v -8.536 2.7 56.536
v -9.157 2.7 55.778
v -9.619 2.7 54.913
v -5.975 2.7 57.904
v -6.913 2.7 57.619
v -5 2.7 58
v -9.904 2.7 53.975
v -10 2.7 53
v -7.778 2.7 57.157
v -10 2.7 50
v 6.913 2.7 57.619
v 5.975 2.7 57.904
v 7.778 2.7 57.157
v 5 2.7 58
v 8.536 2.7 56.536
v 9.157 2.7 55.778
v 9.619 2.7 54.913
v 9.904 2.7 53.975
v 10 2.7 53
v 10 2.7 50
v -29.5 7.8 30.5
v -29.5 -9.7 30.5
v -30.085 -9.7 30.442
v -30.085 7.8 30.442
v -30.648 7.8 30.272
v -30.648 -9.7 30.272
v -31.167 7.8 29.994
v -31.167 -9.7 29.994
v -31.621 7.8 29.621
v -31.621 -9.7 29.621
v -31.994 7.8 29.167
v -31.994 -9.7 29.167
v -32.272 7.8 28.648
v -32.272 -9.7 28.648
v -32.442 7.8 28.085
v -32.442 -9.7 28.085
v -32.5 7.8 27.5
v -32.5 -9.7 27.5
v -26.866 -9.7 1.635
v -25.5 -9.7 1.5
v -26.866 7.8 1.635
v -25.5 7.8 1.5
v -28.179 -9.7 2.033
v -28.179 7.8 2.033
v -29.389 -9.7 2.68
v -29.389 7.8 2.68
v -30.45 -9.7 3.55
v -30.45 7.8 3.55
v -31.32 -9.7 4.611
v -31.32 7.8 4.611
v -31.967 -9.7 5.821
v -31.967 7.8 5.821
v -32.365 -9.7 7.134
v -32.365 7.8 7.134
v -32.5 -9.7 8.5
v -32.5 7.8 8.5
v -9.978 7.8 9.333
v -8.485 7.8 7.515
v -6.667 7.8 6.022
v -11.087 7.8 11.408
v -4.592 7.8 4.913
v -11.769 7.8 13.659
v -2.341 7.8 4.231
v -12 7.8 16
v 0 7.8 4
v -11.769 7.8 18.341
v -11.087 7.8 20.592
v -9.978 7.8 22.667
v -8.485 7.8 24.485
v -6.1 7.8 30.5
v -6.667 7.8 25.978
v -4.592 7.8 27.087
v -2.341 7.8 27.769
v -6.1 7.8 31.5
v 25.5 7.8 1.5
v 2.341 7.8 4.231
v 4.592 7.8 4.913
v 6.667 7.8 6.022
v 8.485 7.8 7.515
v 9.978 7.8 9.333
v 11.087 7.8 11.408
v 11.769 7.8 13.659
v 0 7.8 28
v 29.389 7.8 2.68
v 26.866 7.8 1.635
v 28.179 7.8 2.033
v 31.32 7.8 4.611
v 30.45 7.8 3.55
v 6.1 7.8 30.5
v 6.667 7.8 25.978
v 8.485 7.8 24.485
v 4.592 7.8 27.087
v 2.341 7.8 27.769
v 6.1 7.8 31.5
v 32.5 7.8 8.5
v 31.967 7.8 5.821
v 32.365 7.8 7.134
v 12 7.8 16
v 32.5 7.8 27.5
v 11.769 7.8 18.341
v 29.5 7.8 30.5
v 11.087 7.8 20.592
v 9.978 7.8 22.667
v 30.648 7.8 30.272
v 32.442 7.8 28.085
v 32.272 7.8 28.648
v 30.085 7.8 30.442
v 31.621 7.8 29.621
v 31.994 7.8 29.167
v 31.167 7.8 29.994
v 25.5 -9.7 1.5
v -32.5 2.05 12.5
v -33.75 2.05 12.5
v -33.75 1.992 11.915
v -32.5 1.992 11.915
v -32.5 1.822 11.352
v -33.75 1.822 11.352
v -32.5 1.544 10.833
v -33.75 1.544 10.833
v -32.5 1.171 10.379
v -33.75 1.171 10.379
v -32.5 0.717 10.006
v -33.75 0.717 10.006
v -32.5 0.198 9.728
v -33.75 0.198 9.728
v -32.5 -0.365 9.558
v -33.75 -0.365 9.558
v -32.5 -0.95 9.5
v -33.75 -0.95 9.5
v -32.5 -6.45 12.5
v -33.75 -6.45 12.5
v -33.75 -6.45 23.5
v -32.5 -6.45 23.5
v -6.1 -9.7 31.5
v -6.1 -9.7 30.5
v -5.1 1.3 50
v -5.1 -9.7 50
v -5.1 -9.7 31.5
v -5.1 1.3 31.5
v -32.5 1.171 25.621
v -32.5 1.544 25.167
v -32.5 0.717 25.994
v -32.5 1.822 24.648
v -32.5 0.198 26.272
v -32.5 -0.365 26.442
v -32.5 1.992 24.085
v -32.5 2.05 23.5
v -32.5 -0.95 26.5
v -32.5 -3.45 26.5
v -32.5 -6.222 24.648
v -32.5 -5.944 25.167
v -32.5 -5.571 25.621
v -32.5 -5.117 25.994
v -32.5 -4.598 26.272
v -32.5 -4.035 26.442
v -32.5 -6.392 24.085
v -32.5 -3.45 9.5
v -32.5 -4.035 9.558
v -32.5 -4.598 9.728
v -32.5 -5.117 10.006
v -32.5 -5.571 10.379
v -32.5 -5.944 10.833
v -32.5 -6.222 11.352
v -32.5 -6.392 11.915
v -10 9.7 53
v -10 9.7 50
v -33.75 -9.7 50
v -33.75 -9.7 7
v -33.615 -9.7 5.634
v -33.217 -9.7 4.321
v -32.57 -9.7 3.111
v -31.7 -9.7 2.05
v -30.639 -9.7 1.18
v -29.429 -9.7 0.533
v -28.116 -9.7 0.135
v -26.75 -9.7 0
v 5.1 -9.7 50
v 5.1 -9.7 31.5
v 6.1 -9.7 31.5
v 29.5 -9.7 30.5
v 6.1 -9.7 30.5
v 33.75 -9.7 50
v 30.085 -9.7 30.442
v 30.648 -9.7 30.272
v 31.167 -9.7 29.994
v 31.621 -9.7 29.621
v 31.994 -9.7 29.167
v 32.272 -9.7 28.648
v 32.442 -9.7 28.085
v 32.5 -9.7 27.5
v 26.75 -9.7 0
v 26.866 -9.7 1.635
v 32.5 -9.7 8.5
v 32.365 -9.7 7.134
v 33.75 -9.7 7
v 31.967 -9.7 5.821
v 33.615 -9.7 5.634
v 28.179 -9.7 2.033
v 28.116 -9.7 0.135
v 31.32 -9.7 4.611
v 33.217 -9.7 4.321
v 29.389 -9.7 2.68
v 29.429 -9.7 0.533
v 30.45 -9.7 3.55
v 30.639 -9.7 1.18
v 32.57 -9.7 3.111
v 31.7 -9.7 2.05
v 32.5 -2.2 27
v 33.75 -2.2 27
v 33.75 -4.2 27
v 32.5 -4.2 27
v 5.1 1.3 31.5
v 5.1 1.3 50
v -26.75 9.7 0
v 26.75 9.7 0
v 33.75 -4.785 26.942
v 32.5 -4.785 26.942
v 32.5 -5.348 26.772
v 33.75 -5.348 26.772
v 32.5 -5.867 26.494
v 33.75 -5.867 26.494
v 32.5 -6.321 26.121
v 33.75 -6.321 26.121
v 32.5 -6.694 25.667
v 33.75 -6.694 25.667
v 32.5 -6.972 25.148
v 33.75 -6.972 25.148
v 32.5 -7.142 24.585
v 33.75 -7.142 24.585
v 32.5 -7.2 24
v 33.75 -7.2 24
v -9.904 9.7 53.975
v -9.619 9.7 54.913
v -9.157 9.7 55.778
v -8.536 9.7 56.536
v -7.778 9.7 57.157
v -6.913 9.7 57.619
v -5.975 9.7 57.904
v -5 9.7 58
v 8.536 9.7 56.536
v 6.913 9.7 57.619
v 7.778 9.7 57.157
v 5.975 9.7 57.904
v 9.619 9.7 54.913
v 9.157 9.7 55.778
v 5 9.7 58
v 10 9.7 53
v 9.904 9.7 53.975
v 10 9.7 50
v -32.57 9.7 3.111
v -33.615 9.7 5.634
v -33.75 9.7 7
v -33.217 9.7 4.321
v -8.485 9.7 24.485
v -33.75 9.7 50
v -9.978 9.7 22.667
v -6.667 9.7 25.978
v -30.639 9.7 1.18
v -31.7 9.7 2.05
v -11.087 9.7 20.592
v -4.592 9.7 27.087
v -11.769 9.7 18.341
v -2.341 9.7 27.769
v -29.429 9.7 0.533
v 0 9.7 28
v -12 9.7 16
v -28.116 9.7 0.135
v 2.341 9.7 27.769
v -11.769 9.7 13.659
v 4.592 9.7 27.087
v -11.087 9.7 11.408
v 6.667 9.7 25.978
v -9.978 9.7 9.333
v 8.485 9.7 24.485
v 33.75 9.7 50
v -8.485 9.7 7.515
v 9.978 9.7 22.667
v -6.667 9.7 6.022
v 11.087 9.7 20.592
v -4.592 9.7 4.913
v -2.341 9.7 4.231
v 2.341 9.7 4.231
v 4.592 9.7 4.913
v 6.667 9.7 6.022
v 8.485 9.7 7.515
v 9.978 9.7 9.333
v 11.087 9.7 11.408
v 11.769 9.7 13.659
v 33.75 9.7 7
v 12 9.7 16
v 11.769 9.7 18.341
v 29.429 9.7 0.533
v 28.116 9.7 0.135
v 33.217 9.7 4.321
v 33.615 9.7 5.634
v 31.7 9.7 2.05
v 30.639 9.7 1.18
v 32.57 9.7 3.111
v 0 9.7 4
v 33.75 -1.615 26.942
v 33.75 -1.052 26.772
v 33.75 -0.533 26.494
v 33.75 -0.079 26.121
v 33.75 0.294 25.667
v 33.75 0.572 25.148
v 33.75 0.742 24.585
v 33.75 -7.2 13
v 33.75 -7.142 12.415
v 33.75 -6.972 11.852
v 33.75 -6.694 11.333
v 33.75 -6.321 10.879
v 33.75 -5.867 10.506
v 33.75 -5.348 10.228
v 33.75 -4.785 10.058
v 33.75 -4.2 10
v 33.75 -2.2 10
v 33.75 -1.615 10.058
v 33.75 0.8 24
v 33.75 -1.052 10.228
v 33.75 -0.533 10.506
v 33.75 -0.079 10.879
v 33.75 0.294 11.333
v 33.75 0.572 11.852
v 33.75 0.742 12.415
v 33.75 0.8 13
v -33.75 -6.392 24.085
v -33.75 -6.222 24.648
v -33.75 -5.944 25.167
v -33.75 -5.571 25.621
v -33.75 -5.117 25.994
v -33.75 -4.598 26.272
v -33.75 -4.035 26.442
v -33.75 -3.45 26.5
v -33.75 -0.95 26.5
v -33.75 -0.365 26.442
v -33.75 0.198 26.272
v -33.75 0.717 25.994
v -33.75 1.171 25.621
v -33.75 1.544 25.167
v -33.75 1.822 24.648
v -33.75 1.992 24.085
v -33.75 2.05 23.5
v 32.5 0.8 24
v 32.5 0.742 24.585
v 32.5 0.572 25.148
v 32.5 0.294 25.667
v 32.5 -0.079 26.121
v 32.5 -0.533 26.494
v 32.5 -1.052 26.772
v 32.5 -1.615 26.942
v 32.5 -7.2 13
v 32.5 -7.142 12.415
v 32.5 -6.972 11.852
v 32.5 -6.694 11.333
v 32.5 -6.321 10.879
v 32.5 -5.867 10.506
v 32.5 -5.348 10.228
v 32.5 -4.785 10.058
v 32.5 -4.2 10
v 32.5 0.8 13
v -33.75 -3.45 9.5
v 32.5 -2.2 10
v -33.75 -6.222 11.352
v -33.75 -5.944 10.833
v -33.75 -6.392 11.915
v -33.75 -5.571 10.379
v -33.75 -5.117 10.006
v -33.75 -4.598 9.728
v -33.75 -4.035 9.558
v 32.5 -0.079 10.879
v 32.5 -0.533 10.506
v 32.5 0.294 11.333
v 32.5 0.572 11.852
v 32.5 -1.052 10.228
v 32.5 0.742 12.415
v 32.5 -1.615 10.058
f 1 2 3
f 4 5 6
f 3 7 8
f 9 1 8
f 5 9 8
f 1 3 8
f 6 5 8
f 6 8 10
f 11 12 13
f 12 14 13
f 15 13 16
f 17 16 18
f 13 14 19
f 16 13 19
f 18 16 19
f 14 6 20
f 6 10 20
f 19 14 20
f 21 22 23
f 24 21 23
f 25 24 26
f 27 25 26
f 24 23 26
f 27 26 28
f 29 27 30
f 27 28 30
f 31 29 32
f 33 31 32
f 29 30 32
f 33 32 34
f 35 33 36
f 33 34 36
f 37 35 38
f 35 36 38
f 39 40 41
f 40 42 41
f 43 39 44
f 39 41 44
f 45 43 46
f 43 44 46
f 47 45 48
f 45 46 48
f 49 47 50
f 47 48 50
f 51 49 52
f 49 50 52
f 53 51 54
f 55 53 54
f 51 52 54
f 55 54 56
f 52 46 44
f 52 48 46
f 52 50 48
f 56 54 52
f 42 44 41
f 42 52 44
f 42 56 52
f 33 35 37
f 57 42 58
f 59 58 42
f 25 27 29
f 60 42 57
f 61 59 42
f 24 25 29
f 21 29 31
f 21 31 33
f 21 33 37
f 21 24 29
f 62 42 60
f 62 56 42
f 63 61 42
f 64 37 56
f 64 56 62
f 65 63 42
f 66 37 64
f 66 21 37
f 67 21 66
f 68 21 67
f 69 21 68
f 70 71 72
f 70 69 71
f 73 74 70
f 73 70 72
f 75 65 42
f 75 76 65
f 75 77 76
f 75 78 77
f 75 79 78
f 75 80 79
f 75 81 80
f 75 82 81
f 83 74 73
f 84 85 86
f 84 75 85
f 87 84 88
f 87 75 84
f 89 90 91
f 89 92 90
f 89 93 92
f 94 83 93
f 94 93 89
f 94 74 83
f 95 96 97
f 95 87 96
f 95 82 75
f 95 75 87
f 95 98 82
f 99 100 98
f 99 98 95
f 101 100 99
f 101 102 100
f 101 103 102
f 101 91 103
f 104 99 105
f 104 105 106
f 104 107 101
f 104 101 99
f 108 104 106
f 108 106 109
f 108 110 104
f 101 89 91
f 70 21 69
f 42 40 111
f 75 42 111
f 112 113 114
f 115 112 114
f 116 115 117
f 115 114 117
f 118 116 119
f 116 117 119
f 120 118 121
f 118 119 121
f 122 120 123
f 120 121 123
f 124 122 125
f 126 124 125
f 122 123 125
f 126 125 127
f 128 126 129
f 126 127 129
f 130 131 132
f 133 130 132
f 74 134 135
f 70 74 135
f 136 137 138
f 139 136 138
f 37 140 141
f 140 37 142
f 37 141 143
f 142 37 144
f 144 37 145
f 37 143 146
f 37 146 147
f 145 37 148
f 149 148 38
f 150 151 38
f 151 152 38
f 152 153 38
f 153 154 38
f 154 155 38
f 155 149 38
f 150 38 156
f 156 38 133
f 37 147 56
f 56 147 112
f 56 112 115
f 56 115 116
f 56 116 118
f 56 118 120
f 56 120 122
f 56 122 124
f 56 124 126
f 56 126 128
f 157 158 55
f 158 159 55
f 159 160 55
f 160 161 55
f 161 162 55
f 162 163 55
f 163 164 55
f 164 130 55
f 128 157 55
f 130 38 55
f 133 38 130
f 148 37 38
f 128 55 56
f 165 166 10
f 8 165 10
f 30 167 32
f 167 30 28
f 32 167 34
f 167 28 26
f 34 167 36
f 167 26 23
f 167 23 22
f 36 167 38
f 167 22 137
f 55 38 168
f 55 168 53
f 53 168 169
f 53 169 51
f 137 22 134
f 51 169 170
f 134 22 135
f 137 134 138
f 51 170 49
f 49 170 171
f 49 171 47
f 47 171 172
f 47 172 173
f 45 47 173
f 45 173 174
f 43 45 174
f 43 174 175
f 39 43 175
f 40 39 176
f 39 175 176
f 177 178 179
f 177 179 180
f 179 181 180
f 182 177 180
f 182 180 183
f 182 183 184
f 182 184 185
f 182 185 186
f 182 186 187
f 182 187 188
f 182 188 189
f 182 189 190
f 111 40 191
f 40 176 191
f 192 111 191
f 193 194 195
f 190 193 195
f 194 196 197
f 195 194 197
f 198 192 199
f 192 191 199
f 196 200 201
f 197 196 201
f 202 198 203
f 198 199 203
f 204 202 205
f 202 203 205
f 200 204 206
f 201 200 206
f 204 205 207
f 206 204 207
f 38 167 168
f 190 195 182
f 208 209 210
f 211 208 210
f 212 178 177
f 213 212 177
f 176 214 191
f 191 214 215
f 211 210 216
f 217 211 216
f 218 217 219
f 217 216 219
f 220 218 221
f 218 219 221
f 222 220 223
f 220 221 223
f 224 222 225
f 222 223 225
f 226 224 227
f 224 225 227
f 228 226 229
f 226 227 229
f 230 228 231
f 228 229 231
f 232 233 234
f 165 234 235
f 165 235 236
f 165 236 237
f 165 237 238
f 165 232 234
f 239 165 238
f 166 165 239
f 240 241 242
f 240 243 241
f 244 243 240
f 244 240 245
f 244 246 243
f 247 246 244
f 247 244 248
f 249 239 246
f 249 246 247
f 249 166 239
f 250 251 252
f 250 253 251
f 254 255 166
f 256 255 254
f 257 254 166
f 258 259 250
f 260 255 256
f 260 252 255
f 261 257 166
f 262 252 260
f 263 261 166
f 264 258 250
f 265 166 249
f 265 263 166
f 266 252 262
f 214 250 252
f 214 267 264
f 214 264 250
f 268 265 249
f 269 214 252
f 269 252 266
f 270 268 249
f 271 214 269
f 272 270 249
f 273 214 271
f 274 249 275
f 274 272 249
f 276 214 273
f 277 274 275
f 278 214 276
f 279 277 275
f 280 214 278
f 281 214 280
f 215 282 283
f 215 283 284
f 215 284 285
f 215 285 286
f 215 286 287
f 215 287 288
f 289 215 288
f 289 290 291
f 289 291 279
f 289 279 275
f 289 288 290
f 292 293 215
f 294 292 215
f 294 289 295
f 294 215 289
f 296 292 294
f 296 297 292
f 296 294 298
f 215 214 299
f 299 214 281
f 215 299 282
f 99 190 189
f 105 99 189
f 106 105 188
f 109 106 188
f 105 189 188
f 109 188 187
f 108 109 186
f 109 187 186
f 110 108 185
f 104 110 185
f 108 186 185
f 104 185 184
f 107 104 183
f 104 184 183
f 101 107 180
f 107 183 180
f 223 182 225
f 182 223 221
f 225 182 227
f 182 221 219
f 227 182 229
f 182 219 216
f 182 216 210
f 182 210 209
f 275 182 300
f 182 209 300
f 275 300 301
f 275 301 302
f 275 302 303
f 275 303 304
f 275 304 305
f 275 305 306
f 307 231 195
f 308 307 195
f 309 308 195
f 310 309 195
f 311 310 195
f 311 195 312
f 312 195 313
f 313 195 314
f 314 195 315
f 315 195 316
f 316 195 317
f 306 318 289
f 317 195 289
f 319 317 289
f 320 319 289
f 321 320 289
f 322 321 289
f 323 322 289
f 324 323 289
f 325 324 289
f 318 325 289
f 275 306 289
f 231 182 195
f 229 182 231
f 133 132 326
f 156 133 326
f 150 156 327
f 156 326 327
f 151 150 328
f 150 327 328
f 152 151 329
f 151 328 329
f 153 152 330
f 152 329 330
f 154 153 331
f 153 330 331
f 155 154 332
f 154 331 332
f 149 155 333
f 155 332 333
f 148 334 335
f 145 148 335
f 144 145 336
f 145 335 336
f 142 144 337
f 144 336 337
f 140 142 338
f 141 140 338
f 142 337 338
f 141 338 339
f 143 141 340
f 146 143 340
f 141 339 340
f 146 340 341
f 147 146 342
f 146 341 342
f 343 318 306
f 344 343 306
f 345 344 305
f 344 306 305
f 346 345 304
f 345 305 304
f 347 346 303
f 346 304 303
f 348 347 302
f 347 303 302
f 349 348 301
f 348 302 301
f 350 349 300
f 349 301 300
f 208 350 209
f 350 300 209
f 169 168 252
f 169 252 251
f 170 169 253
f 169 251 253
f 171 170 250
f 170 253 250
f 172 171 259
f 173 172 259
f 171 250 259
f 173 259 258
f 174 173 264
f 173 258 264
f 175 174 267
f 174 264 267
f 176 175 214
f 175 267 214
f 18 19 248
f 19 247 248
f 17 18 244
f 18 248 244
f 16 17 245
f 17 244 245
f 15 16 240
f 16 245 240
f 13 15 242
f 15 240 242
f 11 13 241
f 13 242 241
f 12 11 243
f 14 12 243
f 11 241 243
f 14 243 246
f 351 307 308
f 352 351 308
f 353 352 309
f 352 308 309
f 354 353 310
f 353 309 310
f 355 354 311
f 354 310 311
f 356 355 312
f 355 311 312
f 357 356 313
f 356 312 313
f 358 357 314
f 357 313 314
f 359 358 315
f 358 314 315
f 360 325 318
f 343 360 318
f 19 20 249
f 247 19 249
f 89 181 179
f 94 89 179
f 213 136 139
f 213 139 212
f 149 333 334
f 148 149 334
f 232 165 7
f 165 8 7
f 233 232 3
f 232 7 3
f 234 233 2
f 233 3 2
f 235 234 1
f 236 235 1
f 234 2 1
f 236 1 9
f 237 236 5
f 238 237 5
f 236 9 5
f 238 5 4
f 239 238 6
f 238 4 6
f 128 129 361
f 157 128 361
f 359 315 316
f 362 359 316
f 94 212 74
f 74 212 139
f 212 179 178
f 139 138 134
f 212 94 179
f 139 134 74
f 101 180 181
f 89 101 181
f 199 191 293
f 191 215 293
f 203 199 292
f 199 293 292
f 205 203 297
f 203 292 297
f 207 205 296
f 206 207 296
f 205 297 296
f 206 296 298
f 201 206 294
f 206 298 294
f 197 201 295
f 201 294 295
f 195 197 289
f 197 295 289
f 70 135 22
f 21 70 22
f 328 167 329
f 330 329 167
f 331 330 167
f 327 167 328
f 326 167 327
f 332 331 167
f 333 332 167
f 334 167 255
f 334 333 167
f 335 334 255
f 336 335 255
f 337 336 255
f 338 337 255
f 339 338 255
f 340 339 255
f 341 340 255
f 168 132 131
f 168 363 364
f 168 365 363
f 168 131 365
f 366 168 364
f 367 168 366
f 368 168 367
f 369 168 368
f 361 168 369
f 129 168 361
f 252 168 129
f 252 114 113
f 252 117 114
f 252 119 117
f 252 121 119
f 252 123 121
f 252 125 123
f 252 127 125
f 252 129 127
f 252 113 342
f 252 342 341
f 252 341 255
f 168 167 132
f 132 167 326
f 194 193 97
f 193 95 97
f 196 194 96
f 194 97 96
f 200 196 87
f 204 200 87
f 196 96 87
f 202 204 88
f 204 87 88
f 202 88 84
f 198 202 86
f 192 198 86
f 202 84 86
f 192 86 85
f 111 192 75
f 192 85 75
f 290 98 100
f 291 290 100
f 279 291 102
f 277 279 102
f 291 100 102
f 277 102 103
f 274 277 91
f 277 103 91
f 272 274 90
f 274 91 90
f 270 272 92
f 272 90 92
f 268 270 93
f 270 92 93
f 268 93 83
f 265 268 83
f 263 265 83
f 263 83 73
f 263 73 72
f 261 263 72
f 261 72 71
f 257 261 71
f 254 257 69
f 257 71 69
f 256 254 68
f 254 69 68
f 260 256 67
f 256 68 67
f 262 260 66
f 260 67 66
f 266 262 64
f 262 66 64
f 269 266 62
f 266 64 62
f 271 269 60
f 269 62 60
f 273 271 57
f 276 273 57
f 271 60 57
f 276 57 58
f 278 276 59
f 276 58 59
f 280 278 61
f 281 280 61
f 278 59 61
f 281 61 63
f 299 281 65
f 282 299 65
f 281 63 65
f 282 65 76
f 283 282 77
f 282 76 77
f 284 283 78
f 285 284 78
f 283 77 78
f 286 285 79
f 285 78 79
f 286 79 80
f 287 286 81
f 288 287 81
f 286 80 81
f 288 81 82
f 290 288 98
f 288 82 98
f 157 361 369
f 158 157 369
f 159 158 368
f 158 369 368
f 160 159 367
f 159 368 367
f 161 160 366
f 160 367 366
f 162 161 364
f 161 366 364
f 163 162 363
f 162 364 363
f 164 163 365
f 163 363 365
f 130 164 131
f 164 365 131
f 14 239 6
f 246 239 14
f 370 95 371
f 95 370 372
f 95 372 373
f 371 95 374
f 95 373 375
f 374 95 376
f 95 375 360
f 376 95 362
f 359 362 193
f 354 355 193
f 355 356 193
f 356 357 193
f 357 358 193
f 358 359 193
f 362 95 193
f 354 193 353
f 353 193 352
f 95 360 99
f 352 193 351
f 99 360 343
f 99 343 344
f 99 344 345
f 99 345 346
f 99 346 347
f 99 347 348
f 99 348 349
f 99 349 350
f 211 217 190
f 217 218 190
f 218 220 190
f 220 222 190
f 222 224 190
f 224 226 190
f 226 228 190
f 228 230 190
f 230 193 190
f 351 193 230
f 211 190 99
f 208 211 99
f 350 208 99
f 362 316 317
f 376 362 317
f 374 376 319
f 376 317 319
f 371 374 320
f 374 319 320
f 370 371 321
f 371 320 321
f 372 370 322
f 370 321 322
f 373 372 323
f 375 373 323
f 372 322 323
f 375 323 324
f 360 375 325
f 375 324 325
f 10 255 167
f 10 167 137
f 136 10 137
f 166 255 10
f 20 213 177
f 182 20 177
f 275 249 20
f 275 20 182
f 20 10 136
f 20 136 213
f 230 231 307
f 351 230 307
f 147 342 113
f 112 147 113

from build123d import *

# Parameters (mm, degrees)
F0_W      = 67.5
F0_H      = 19.4
F1_DEPTH  = 50
F3_DEPTH  = 17.5
F4_R      = 12
F5_DEPTH  = 1.9
F7_DEPTH  = 1.25
F8_DEPTH  = 11
F9_R      = 7
F11_DEPTH = 8
F12_R     = 5
F14_DEPTH = 1.25


with BuildPart() as f1:
    # F0 (on Top) → F1 (new body)
    with BuildSketch(Plane.XY):
        Rectangle(F0_W, F0_H)
    extrude(amount=F1_DEPTH)

    # F2 (on face) → F3 (cut)
    with BuildSketch(Plane.XZ.offset(9.7)):
        with BuildLine():
            Line((-6.1, 31.5), (-6.1, 30.5))
            Line((-6.1, 30.5), (-29.5, 30.5))
            ThreePointArc((-29.5, 30.5), (-31.62132, 29.62132), (-32.5, 27.5))
            Line((-32.5, 27.5), (-32.5, 1.5))
            Line((-32.5, 1.5), (0, 1.5))
            Line((0, 1.5), (32.5, 1.5))
            Line((32.5, 1.5), (32.5, 27.5))
            ThreePointArc((32.5, 27.5), (31.62132, 29.62132), (29.5, 30.5))
            Line((29.5, 30.5), (6.1, 30.5))
            Line((6.1, 30.5), (6.1, 31.5))
            Line((6.1, 31.5), (5.1, 31.5))
            Line((5.1, 31.5), (0, 31.5))
            Line((0, 31.5), (-5.1, 31.5))
            Line((-5.1, 31.5), (-6.1, 31.5))
        make_face()
    extrude(amount=-F3_DEPTH, mode=Mode.SUBTRACT)

    # F4 (on face) → F5 (cut, through all)
    with BuildSketch(Plane.XZ.offset(-7.8)):
        with Locations((0, 16)):
            Circle(F4_R)
    extrude(amount=-F5_DEPTH, mode=Mode.SUBTRACT)

    # F6 (on face) → F7 (cut, through all)
    with BuildSketch(Plane(origin=(-33.75, 0, 0), x_dir=(0, -1, 0), z_dir=(-1, 0, 0))):
        with BuildLine():
            Line((3.45, 26.5), (0.95, 26.5))
            ThreePointArc((0.95, 26.5), (-1.17132, 25.62132), (-2.05, 23.5))
            Line((-2.05, 23.5), (-2.05, 12.5))
            ThreePointArc((-2.05, 12.5), (-1.17132, 10.37868), (0.95, 9.5))
            Line((0.95, 9.5), (3.45, 9.5))
            ThreePointArc((3.45, 9.5), (5.57132, 10.37868), (6.45, 12.5))
            Line((6.45, 12.5), (6.45, 23.5))
            ThreePointArc((6.45, 23.5), (5.57132, 25.62132), (3.45, 26.5))
        make_face()
    extrude(amount=-F7_DEPTH, mode=Mode.SUBTRACT)

    # F2 (on face) → F8 (cut)
    with BuildSketch(Plane.XZ.offset(9.7)):
        Polygon((-5.1, 50), (-5.1, 31.5), (0, 31.5), (5.1, 31.5), (5.1, 50), (0, 50), align=None)
    extrude(amount=-F8_DEPTH, mode=Mode.SUBTRACT)

    # F9
    f9_edges = [f1.edges().sort_by_distance(p)[0] for p in [
        (32.5, -0.95, 1.5),
        (-33.75, 0, 0),
        (-32.5, -0.95, 1.5),
        (33.75, 0, 0),
    ]]
    fillet(f9_edges, radius=F9_R)

    # F10 (on face) → F11 (join)
    with BuildSketch(Plane.XY.offset(50)):
        Polygon((10, 9.7), (0, 9.7), (-10, 9.7), (-10, 2.7), (0, 2.7), (10, 2.7), align=None)
    extrude(amount=F11_DEPTH)

    # F12
    f12_edges = [f1.edges().sort_by_distance(p)[0] for p in [
        (10, 6.2, 58),
        (-10, 6.2, 58),
    ]]
    fillet(f12_edges, radius=F12_R)

    # F13 (on face) → F14 (cut, through all)
    with BuildSketch(Plane.YZ.offset(33.75)):
        with BuildLine():
            Line((-2.2, 27), (-4.2, 27))
            ThreePointArc((-4.2, 27), (-6.32132, 26.12132), (-7.2, 24))
            Line((-7.2, 24), (-7.2, 13))
            ThreePointArc((-7.2, 13), (-6.32132, 10.87868), (-4.2, 10))
            Line((-4.2, 10), (-2.2, 10))
            ThreePointArc((-2.2, 10), (-0.07868, 10.87868), (0.8, 13))
            Line((0.8, 13), (0.8, 24))
            ThreePointArc((0.8, 24), (-0.07868, 26.12132), (-2.2, 27))
        make_face()
    extrude(amount=-F14_DEPTH, mode=Mode.SUBTRACT)


solid = f1.part
